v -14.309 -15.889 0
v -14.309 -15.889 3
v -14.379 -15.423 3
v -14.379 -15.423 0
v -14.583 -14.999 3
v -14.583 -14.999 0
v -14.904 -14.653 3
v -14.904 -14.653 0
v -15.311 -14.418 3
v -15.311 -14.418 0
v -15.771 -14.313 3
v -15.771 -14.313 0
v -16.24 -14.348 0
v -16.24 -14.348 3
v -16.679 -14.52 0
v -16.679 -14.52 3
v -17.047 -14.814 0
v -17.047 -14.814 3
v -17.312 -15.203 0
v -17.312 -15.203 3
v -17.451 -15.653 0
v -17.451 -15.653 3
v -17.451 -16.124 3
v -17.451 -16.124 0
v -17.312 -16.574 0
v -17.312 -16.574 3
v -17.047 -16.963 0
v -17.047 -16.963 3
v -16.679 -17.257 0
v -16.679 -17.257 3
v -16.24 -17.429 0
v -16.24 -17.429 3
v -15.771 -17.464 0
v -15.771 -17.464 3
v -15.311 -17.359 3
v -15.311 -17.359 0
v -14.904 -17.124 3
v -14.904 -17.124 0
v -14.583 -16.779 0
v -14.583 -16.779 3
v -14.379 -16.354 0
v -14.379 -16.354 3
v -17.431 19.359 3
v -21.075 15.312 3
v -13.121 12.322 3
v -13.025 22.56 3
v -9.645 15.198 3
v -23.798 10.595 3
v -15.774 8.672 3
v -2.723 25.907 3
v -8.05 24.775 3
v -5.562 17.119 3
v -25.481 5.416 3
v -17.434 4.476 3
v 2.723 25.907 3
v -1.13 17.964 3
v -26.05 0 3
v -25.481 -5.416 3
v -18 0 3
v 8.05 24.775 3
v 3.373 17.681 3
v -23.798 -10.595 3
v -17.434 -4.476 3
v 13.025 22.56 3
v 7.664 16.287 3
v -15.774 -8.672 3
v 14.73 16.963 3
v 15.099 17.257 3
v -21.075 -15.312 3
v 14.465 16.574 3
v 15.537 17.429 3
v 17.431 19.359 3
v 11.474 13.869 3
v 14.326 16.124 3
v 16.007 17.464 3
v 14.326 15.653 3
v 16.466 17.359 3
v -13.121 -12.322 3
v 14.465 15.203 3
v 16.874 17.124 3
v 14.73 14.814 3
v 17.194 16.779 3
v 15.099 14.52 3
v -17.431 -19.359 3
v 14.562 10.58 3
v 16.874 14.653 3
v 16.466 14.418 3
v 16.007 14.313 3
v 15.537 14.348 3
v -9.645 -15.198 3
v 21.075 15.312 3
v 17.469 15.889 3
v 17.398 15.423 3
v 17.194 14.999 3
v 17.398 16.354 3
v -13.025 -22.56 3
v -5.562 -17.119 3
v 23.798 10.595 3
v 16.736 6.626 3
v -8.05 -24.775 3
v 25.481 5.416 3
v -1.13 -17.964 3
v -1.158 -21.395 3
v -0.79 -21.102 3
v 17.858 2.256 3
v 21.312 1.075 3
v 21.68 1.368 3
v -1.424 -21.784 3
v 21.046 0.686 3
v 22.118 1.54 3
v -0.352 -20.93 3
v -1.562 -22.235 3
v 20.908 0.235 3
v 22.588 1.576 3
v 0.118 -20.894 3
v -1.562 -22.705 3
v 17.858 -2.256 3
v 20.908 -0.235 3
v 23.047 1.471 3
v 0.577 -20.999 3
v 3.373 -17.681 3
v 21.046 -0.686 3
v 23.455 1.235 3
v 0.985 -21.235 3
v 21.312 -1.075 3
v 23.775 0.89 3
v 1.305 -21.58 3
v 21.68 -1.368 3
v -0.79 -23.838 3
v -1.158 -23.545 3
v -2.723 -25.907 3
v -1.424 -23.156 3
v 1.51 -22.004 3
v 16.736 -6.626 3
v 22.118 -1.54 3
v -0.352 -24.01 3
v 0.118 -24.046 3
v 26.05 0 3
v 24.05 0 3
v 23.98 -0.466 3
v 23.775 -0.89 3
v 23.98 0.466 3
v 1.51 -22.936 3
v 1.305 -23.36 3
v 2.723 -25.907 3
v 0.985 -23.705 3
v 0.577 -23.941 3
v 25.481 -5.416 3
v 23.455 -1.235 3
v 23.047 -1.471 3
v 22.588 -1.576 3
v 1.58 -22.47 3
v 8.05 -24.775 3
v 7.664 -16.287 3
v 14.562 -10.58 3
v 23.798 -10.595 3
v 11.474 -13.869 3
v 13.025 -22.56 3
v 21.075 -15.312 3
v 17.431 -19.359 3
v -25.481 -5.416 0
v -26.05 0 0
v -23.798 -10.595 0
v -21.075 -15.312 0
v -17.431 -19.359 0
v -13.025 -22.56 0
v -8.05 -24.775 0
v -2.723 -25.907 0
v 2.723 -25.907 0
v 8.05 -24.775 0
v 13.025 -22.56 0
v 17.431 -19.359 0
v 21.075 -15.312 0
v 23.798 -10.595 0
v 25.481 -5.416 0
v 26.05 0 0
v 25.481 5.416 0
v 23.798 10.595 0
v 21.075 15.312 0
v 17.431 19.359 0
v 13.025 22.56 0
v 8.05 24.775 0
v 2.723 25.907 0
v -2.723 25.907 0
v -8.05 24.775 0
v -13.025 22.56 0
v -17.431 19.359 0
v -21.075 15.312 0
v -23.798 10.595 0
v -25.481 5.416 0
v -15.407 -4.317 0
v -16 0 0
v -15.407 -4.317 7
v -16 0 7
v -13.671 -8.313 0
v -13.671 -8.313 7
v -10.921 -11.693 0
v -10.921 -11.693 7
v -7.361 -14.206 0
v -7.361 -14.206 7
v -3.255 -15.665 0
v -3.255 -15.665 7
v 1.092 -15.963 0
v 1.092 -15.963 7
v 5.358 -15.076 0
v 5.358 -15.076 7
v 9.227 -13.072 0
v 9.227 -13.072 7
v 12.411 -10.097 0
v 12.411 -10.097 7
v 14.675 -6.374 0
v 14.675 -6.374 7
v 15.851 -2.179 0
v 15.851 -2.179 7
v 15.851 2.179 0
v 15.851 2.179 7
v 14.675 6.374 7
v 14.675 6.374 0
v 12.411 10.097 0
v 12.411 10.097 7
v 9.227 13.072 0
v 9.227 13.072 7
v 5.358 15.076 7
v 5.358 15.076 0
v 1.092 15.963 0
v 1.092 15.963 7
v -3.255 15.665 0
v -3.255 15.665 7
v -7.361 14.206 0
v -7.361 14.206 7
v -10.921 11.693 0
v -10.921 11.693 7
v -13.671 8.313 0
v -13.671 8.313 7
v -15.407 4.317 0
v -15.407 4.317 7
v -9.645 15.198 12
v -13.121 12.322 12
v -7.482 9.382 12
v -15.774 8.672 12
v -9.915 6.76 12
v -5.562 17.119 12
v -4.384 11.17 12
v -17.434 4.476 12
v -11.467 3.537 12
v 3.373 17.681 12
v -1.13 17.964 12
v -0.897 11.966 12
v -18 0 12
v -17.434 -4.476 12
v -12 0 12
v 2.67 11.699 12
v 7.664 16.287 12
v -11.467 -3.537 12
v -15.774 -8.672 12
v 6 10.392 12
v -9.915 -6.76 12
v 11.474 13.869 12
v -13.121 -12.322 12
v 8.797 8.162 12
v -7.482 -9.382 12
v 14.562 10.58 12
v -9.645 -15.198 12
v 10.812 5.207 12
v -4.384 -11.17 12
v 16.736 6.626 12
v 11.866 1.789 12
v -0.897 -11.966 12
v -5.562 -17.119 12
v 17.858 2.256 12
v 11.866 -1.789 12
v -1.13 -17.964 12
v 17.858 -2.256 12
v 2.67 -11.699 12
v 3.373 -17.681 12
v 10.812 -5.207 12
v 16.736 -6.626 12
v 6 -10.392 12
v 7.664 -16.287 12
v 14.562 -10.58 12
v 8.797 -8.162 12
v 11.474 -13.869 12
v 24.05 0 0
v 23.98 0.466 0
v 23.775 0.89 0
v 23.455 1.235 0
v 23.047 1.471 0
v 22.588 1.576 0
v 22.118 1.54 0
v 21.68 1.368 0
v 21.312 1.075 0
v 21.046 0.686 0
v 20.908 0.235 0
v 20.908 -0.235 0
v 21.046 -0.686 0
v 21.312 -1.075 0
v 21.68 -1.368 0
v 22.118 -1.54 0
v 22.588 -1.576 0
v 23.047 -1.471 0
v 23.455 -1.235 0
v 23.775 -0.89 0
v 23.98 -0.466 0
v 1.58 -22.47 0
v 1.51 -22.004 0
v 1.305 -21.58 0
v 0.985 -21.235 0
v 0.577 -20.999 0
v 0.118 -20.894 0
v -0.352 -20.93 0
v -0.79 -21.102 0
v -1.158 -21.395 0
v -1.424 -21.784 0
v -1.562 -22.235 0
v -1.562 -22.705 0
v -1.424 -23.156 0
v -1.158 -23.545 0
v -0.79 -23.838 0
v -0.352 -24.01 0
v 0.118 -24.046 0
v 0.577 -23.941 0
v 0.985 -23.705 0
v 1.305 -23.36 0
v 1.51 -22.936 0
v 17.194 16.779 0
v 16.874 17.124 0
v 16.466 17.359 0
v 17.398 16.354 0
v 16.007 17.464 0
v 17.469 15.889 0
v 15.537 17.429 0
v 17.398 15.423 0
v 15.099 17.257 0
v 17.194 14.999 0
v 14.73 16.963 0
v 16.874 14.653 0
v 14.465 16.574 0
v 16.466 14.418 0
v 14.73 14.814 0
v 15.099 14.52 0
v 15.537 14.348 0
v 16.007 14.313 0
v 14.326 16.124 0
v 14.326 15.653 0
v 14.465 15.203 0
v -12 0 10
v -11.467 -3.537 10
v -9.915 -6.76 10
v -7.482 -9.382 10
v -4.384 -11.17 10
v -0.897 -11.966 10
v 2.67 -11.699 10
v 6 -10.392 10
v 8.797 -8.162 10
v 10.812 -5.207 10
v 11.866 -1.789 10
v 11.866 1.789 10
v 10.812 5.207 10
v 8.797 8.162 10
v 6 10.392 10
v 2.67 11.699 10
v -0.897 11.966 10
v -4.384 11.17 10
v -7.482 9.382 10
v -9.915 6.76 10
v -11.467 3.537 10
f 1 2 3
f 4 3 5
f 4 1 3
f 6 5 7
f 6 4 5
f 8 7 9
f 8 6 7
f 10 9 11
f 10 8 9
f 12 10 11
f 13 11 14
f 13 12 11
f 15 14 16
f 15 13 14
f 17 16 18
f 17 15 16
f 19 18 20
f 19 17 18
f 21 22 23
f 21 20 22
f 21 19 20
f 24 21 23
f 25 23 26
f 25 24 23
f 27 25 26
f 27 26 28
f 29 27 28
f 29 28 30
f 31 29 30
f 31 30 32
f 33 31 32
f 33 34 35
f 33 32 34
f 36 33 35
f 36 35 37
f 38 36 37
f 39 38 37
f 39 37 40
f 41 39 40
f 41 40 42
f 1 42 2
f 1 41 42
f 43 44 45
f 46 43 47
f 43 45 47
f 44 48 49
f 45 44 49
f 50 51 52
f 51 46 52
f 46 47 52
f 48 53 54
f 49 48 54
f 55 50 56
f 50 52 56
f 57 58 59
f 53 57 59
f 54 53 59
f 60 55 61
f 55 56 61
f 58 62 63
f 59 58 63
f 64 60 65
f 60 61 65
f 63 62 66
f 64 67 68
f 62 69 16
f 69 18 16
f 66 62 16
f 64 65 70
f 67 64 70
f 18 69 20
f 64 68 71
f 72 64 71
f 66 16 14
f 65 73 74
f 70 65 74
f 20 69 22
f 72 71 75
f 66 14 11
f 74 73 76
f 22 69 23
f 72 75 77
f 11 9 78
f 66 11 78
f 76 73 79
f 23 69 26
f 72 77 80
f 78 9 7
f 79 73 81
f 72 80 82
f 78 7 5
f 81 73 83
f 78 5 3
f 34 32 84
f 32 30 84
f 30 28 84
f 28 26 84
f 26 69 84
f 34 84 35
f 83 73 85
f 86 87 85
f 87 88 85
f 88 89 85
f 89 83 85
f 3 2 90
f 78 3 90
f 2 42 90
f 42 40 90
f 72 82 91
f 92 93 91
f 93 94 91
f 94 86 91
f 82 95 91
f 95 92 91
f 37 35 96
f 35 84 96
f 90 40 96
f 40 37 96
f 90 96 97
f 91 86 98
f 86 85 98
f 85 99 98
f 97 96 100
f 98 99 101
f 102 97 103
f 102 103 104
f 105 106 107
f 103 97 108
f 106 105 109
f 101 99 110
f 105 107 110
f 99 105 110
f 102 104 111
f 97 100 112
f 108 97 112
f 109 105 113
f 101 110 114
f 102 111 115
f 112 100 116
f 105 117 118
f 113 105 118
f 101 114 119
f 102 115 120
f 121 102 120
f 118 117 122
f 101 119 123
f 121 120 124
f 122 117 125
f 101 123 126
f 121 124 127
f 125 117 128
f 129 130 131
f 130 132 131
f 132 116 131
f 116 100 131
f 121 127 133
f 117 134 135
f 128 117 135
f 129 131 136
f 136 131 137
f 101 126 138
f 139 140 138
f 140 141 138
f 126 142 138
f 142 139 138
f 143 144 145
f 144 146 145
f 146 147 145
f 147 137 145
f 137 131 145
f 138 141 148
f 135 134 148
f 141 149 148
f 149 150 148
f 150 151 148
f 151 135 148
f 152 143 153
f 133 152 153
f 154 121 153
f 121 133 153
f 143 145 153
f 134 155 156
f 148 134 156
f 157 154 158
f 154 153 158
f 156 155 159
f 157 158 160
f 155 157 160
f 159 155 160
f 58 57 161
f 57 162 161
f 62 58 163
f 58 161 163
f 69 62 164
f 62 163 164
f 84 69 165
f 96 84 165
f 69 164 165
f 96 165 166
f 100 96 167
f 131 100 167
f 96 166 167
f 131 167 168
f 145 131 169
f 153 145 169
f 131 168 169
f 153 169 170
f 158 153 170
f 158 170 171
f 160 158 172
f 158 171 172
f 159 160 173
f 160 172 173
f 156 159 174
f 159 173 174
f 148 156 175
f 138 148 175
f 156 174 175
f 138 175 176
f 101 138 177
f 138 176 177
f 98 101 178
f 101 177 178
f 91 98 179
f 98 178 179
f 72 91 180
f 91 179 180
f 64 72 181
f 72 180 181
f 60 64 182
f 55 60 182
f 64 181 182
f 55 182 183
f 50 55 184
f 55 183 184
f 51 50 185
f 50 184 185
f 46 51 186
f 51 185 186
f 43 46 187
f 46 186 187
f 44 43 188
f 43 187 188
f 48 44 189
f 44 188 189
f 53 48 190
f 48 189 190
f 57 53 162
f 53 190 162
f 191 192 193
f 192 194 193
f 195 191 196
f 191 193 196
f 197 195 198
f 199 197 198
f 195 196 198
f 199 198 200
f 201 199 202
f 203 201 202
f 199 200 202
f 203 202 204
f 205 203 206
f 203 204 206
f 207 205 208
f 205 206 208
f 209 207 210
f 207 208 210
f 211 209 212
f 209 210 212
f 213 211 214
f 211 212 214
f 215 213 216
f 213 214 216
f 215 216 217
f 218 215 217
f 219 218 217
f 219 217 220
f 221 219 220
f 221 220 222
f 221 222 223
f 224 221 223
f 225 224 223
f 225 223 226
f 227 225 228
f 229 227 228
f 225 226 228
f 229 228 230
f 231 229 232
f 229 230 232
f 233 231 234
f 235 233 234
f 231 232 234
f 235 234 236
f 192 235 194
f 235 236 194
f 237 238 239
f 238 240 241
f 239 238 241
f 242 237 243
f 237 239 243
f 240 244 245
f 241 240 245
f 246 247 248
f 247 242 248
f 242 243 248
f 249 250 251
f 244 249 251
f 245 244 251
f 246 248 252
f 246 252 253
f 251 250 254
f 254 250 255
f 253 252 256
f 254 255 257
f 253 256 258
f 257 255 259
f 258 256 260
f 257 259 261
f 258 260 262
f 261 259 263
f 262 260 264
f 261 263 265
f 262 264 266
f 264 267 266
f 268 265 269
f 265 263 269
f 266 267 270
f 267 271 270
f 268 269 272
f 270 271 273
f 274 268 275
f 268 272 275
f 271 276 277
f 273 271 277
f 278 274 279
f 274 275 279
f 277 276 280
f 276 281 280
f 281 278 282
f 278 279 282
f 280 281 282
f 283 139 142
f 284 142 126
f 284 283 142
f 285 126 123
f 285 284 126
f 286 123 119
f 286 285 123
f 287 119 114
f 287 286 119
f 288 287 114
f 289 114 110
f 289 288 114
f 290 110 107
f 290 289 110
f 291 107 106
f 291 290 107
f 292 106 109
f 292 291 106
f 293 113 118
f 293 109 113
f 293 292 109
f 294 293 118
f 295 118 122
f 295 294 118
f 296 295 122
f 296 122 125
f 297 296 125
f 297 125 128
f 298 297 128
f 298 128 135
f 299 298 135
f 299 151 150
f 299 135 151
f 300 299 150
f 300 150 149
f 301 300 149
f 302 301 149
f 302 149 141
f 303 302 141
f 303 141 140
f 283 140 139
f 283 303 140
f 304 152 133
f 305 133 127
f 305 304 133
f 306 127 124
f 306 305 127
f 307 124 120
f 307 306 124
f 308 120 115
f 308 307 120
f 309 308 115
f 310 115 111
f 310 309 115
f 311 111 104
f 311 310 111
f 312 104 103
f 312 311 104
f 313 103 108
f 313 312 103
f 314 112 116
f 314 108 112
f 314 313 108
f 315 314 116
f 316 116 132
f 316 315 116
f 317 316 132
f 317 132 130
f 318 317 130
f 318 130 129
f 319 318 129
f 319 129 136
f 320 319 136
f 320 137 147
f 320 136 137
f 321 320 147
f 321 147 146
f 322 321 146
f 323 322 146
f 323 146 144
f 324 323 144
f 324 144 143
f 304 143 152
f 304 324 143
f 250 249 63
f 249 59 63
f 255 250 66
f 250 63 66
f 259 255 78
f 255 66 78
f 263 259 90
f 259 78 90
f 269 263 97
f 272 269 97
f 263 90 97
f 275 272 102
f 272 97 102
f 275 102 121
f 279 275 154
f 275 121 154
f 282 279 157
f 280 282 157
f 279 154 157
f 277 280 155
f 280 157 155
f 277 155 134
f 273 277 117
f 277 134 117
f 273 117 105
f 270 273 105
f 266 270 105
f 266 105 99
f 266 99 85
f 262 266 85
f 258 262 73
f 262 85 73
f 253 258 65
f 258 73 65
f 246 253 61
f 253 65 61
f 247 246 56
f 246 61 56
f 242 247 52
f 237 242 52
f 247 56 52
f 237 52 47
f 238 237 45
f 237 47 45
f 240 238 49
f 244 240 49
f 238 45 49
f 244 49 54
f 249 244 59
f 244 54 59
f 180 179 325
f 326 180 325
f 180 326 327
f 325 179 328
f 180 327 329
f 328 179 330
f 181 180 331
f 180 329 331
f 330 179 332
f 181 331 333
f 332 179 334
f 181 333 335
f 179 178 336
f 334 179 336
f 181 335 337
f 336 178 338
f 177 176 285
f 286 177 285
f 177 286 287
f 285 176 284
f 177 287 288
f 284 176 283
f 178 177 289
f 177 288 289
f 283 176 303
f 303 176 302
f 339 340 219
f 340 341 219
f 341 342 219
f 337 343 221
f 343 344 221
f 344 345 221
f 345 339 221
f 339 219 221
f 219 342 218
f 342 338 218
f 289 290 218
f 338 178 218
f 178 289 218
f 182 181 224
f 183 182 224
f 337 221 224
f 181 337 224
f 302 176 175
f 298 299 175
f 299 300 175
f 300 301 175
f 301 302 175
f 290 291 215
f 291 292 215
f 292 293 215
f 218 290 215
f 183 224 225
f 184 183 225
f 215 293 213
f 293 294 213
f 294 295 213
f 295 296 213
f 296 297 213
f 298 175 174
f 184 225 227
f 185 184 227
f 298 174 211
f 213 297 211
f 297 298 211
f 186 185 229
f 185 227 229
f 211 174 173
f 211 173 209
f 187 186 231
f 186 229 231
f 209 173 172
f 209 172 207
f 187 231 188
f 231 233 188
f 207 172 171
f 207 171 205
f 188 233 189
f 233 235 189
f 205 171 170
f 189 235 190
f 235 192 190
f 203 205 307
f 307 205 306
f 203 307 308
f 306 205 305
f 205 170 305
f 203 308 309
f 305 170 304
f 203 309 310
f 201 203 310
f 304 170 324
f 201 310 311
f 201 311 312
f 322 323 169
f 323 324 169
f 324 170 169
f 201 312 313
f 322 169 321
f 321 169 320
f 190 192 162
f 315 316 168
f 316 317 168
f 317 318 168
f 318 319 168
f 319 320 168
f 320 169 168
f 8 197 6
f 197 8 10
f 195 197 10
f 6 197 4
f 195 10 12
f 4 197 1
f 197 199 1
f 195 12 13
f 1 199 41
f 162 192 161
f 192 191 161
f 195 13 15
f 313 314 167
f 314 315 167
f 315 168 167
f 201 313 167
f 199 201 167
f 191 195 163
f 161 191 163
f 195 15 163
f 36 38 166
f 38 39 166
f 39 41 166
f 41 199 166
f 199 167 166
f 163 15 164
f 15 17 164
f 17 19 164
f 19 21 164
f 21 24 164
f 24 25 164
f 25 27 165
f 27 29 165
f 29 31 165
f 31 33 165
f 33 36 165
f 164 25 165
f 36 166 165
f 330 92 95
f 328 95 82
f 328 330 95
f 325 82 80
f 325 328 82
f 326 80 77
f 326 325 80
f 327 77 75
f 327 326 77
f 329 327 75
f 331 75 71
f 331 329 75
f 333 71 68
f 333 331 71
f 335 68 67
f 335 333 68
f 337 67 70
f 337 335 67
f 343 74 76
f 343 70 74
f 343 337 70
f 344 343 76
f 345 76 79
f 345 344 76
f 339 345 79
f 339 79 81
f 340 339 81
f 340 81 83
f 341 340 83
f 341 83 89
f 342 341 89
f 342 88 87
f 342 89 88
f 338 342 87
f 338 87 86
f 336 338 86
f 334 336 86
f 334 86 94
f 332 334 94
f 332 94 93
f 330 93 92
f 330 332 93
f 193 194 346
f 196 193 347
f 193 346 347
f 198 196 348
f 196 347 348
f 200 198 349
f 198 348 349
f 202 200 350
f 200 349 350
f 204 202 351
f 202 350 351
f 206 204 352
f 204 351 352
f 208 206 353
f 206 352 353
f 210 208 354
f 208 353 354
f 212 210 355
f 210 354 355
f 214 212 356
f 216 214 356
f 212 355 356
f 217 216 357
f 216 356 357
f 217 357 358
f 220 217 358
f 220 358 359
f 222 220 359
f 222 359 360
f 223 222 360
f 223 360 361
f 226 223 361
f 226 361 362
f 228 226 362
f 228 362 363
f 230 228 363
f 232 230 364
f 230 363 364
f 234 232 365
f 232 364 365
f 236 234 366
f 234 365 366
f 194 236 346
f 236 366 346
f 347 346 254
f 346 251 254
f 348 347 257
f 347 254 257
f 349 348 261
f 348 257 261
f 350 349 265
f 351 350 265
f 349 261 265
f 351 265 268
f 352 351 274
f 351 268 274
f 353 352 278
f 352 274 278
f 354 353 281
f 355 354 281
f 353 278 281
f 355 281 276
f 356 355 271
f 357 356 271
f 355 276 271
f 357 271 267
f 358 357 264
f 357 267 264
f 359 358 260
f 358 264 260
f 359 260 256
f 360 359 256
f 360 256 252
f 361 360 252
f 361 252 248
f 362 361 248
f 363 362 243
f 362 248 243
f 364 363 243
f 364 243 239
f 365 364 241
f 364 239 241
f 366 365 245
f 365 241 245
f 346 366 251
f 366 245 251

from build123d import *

# Parameters (mm, degrees)
SKETCH001_R       = 1.58
POCKET_DEPTH      = 0.001
POCKET_DEPTH_BACK = -12.001


with BuildPart() as part:
    # Sketch → Revolution (revolve)
    with BuildSketch(Plane.XZ):
        Polygon((-16, 7), (-12, 10), (-12, 12), (-18, 12), (-18, 3), (-26.05, 3), (-26.05, 0), (-16, 0), align=None)
    revolve(axis=Axis((0, 0, 0), (0, 0, 1)))

    # Sketch001 → Pocket (cut, two sides)
    with BuildSketch(Plane.XY) as pocket_sk:
        with Locations((22.47, 0)):
            Circle(SKETCH001_R)
        with Locations((0, -22.47)):
            Circle(SKETCH001_R)
        with Locations((-15.888689, -15.888689)):
            Circle(SKETCH001_R)
        with Locations((15.888689, 15.888689)):
            Circle(SKETCH001_R)
    extrude(amount=-POCKET_DEPTH, mode=Mode.SUBTRACT)
    extrude(pocket_sk.sketch, amount=-POCKET_DEPTH_BACK, mode=Mode.SUBTRACT)


solid = part.part
